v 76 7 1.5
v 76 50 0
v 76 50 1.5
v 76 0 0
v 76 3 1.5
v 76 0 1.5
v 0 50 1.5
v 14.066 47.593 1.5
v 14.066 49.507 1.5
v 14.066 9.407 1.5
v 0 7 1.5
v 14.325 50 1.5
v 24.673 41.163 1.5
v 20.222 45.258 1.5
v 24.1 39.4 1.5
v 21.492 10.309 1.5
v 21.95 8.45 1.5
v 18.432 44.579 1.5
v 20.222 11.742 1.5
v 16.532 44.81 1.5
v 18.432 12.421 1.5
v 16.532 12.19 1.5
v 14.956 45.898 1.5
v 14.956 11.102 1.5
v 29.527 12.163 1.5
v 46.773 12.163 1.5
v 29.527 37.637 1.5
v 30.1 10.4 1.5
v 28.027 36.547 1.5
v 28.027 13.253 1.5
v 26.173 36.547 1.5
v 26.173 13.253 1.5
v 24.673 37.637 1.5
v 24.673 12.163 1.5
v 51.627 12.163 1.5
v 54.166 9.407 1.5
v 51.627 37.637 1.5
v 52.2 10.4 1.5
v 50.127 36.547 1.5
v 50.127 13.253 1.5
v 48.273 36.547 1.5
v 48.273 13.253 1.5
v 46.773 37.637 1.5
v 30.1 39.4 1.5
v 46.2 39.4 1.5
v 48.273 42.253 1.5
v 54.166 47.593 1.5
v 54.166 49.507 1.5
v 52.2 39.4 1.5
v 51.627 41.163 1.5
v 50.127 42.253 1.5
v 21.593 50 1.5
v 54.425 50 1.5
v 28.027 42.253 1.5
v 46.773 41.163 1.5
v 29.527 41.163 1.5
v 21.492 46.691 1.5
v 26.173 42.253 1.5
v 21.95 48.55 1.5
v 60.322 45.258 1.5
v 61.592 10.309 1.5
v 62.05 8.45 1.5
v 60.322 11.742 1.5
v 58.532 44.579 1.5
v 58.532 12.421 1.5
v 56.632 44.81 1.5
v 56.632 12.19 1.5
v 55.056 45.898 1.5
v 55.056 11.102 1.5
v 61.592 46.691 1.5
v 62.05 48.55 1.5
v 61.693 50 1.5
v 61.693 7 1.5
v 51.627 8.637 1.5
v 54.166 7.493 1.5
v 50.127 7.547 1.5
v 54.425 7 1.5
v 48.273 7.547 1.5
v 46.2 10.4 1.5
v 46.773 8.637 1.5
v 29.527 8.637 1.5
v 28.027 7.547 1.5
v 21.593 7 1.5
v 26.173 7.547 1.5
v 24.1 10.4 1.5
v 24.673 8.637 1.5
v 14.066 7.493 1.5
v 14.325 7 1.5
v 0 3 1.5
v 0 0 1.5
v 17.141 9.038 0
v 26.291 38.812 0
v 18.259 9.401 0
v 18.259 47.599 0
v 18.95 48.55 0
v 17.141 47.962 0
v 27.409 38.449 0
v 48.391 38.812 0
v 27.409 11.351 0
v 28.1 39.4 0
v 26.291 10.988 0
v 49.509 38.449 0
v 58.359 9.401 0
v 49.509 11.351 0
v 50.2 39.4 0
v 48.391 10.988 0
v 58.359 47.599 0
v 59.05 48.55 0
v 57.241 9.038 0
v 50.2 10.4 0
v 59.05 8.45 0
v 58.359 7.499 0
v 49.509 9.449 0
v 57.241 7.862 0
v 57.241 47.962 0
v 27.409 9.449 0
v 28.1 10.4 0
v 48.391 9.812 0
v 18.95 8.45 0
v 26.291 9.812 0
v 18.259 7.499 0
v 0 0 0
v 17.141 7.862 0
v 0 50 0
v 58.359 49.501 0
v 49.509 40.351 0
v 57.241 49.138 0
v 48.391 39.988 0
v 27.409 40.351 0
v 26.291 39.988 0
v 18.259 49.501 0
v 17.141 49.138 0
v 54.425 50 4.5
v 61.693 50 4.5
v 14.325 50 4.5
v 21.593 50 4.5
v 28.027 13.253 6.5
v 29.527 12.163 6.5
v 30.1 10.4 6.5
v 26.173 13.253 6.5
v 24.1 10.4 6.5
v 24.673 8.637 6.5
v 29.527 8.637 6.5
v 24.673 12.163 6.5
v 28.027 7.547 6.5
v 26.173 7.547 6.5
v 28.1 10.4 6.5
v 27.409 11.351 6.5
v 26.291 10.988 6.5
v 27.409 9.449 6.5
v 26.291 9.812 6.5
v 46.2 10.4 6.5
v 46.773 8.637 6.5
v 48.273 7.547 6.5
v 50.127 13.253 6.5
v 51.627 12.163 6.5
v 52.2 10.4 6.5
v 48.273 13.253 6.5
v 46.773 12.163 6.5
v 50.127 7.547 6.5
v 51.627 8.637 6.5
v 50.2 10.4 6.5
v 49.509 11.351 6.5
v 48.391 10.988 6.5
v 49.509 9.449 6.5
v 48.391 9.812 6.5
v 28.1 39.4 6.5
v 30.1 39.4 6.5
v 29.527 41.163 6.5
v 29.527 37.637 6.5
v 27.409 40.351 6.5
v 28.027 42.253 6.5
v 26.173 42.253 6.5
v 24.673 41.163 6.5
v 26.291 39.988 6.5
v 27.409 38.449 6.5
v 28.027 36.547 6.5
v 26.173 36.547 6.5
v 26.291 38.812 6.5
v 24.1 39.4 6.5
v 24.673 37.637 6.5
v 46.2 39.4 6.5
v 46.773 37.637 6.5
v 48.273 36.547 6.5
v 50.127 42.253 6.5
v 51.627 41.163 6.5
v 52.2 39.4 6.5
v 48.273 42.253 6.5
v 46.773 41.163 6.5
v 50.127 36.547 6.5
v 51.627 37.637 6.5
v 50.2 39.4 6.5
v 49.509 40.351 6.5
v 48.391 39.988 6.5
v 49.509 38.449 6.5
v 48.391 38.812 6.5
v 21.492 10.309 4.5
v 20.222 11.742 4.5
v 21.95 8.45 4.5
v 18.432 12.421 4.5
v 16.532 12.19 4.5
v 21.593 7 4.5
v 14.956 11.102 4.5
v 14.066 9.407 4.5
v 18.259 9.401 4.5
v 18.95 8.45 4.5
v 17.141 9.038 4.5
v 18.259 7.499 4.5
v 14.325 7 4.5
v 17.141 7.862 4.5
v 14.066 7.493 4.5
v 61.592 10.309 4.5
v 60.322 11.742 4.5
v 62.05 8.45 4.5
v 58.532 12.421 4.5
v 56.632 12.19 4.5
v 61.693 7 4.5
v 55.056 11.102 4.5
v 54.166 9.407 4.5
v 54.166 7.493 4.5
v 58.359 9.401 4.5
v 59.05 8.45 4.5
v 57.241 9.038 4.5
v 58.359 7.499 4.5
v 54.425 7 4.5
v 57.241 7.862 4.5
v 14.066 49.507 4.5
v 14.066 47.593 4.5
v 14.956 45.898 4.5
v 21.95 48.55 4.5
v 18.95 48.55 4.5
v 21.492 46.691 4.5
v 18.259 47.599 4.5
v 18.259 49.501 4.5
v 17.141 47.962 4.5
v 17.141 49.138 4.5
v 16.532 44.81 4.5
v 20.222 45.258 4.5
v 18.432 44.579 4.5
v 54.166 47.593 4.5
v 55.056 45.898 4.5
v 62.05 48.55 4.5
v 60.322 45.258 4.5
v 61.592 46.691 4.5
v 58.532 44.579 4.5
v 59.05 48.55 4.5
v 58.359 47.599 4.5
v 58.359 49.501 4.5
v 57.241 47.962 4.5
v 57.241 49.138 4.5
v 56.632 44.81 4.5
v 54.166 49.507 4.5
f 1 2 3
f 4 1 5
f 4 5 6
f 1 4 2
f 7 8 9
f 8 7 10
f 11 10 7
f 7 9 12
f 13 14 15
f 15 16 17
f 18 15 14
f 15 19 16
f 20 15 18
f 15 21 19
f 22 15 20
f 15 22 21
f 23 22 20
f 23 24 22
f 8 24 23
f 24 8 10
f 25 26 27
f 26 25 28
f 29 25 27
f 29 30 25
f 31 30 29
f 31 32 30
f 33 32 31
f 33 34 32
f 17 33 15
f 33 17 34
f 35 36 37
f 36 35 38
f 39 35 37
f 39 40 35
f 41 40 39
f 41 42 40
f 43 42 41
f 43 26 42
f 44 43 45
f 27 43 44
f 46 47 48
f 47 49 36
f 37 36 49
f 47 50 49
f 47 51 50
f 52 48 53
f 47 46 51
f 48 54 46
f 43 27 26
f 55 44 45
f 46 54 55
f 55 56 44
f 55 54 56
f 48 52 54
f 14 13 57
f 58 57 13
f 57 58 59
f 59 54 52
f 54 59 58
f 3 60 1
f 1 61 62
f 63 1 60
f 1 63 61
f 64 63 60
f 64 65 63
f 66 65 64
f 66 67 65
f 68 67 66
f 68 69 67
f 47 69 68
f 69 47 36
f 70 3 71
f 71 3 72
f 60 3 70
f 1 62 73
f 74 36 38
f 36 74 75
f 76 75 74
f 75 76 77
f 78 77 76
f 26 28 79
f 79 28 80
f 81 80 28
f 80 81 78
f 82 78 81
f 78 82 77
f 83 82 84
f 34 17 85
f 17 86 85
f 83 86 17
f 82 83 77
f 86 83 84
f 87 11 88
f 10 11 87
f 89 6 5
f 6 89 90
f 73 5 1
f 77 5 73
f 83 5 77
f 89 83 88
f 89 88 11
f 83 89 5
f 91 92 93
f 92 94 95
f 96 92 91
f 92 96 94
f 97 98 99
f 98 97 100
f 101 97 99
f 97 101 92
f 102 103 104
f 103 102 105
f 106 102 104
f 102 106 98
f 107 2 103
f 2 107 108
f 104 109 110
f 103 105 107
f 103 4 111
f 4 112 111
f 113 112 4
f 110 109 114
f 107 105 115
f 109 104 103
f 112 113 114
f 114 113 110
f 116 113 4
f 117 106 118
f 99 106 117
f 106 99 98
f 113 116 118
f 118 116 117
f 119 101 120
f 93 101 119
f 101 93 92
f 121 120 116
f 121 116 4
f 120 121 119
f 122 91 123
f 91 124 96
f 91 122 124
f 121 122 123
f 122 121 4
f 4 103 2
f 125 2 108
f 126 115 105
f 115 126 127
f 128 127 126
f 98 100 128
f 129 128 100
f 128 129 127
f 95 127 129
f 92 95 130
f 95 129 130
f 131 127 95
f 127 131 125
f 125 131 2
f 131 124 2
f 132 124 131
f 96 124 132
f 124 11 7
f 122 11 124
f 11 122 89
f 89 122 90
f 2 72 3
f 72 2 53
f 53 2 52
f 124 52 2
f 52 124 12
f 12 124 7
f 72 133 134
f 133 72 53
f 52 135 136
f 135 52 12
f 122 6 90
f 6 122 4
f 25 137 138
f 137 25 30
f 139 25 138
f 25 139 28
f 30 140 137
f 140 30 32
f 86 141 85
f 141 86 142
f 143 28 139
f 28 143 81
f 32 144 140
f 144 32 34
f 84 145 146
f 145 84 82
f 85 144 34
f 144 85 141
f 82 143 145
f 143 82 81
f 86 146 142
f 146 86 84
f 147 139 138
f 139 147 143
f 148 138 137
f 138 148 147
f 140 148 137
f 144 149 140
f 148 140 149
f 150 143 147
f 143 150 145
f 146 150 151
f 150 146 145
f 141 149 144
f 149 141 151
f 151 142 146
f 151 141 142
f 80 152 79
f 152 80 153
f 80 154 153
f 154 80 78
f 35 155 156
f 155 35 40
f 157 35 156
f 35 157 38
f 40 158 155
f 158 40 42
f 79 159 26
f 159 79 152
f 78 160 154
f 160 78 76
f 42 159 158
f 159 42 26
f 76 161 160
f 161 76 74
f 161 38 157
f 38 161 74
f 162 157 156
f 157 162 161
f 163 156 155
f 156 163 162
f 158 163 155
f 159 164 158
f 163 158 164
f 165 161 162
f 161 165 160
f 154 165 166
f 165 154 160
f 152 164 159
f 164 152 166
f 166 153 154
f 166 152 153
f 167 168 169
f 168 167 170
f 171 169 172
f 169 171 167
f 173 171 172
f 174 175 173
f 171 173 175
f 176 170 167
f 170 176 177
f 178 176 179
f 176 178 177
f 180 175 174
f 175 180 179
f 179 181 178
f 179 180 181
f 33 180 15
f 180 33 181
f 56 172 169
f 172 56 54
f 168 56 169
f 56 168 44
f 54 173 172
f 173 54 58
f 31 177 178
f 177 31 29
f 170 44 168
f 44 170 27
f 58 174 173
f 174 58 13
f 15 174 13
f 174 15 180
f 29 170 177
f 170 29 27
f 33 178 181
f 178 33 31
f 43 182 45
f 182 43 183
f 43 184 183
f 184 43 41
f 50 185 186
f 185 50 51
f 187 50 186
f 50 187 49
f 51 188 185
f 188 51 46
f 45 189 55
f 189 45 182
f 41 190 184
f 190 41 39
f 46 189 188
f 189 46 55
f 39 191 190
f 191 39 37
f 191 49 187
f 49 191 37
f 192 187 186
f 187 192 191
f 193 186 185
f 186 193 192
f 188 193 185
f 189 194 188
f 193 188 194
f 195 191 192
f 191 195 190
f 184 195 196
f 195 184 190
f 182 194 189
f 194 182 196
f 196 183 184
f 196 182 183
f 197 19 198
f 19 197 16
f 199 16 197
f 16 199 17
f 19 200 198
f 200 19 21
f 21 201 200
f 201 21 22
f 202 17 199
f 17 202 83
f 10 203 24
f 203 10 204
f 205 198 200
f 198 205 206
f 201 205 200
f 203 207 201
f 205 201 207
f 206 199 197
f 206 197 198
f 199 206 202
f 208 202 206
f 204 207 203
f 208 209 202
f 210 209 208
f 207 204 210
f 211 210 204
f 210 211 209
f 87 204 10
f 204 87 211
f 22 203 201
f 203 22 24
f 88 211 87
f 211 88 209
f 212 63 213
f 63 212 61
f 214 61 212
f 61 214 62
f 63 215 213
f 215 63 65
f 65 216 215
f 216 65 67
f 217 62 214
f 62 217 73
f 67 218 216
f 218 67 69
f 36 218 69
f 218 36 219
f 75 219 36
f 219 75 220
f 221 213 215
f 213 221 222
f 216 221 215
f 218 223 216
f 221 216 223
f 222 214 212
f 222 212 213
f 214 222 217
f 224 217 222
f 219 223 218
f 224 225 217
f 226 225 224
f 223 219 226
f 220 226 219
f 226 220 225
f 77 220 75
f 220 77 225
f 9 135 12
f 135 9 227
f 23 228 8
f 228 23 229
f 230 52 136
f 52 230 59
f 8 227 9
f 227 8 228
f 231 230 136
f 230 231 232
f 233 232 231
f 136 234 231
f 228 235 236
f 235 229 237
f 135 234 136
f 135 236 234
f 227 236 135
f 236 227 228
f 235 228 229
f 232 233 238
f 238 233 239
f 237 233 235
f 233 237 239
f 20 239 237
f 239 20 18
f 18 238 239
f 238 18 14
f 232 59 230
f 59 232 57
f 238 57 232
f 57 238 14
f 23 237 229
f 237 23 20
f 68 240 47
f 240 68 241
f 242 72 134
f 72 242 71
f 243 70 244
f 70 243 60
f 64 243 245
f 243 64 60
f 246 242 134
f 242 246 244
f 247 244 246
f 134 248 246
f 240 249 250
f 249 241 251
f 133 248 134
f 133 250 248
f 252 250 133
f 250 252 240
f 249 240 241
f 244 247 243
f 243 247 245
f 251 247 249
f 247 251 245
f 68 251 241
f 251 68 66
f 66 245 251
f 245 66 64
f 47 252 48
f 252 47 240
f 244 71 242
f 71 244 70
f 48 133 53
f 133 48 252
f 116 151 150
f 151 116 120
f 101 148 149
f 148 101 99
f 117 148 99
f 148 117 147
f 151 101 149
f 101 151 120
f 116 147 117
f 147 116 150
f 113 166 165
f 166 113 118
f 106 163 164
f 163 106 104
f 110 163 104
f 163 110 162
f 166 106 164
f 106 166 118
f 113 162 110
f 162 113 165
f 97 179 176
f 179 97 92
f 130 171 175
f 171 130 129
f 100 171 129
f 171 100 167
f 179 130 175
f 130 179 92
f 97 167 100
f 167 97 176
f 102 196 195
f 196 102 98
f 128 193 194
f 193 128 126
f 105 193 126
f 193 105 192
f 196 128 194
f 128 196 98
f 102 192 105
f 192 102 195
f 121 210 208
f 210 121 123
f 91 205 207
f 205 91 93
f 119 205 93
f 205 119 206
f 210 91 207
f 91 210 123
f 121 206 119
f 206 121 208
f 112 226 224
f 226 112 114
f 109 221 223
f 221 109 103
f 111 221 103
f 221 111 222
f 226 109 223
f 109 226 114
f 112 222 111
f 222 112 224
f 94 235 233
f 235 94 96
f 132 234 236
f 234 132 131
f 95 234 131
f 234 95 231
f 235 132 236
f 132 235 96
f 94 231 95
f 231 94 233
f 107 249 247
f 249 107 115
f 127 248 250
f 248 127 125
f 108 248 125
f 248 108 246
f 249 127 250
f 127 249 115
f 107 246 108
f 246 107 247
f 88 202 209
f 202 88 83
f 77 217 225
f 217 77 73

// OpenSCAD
// Plate
plateX = 76;
plateY = 50;
plateZThickness = 1.5;

plateXZero = 38;
plateYZero = 28.5;


//RoboPhilo mount variables
//Screw Hole size is to allow screws to pass through without biting
rpScrewHoleSize = 1;

rpXLeft = 26 + 1.1;
rpXRight = 48.1 + 1.1;
rpXMidSpace = 20;

rpYBottom = 9.3 + 1.1;
rpYTop = 38.3 + 1.1;
rpYMidSpace = 27;

rpScrewMountZ = 5;
rpScrewmountDiameter = 3;

//ezRobot mount variables
//Screw hole size here is to allow #4 screws to bite into it
//You can change the screwhole size and the hole will stay in the same position
ezrScrewHoleSize = 1;
ezrOffset = 17.5 + 2.55; //2.55 is the center of the hole on teh ezbv4
ezrScrewMountZ = 3;
ezrScrewMountDiameter = 4;

difference(){
union(){
// Plate
cube([plateX,plateY,plateZThickness]);

//RoboPhilo screw mounts
//fixed position based on the actual plate
//lower left
color([1,0,0])
translate([rpXLeft,rpYBottom,plateZThickness])
cylinder(rpScrewMountZ,rpScrewmountDiameter,rpScrewmountDiameter);

//lower right
color([1,0,0])
translate([rpXRight,rpYBottom,plateZThickness])
cylinder(rpScrewMountZ,rpScrewmountDiameter,rpScrewmountDiameter);

//upper left
color([1,0,0])
translate([rpXLeft,rpYTop,plateZThickness])
cylinder(rpScrewMountZ,rpScrewmountDiameter,rpScrewmountDiameter);

//upper right
color([1,0,0])
translate([rpXRight,rpYTop,plateZThickness])
cylinder(rpScrewMountZ,rpScrewmountDiameter,rpScrewmountDiameter);

//EZ Robot Screw mounts
//calculated based on the center coordinates of the plate
//lower left
color([0,1,0])
translate([plateXZero-ezrOffset,plateYZero-ezrOffset,plateZThickness])
cylinder(ezrScrewMountZ,ezrScrewMountDiameter,ezrScrewMountDiameter);

//lower right
color([0,1,0])
translate([plateXZero+ezrOffset,plateYZero-ezrOffset,plateZThickness])
cylinder(ezrScrewMountZ,ezrScrewMountDiameter,ezrScrewMountDiameter);

//upper left
color([0,1,0])
translate([plateXZero-ezrOffset,plateYZero+ezrOffset,plateZThickness])
cylinder(ezrScrewMountZ,ezrScrewMountDiameter,ezrScrewMountDiameter);

//upper right
color([0,1,0])
translate([plateXZero+ezrOffset,plateYZero+ezrOffset,plateZThickness])
cylinder(ezrScrewMountZ,ezrScrewMountDiameter,ezrScrewMountDiameter);

} //end union() of plate



//mount holes to mount to RoboPhilo
//lower left
color([0,0,1])
translate([rpXLeft,rpYBottom,-1])
cylinder(10,rpScrewHoleSize,rpScrewHoleSize);

//lower right
color([0,0,1])
translate([rpXRight,rpYBottom,-1])
cylinder(10,rpScrewHoleSize,rpScrewHoleSize);

//upper left
color([0,0,1])
translate([rpXLeft,rpYTop,-1])
cylinder(10,rpScrewHoleSize,rpScrewHoleSize);

//upper right
color([0,0,1])
translate([rpXRight,rpYTop,-1])
cylinder(10,rpScrewHoleSize,rpScrewHoleSize);

//EZ Robot Screw holes
//lower left
color([0,0,1])
translate([plateXZero-ezrOffset,plateYZero-ezrOffset, -1])
cylinder(10,ezrScrewHoleSize,ezrScrewHoleSize);

//lower right
color([0,0,1])
translate([plateXZero+ezrOffset,plateYZero-ezrOffset, -1])
cylinder(10,ezrScrewHoleSize,ezrScrewHoleSize);

//upper left
color([0,0,1])
translate([plateXZero-ezrOffset,plateYZero+ezrOffset, -1])
cylinder(10,ezrScrewHoleSize,ezrScrewHoleSize);

//upper right
color([0,0,1])
translate([plateXZero+ezrOffset,plateYZero+ezrOffset, -1])
cylinder(10,ezrScrewHoleSize,ezrScrewHoleSize);

//top cutoff
color([1,1,0])
translate([0,50,0])
cube([plateX,4,10]);

//bottom cutoff
color([1,1,0])
translate([0,3,plateZThickness])
cube([plateX,4,10]);

} // end difference()
